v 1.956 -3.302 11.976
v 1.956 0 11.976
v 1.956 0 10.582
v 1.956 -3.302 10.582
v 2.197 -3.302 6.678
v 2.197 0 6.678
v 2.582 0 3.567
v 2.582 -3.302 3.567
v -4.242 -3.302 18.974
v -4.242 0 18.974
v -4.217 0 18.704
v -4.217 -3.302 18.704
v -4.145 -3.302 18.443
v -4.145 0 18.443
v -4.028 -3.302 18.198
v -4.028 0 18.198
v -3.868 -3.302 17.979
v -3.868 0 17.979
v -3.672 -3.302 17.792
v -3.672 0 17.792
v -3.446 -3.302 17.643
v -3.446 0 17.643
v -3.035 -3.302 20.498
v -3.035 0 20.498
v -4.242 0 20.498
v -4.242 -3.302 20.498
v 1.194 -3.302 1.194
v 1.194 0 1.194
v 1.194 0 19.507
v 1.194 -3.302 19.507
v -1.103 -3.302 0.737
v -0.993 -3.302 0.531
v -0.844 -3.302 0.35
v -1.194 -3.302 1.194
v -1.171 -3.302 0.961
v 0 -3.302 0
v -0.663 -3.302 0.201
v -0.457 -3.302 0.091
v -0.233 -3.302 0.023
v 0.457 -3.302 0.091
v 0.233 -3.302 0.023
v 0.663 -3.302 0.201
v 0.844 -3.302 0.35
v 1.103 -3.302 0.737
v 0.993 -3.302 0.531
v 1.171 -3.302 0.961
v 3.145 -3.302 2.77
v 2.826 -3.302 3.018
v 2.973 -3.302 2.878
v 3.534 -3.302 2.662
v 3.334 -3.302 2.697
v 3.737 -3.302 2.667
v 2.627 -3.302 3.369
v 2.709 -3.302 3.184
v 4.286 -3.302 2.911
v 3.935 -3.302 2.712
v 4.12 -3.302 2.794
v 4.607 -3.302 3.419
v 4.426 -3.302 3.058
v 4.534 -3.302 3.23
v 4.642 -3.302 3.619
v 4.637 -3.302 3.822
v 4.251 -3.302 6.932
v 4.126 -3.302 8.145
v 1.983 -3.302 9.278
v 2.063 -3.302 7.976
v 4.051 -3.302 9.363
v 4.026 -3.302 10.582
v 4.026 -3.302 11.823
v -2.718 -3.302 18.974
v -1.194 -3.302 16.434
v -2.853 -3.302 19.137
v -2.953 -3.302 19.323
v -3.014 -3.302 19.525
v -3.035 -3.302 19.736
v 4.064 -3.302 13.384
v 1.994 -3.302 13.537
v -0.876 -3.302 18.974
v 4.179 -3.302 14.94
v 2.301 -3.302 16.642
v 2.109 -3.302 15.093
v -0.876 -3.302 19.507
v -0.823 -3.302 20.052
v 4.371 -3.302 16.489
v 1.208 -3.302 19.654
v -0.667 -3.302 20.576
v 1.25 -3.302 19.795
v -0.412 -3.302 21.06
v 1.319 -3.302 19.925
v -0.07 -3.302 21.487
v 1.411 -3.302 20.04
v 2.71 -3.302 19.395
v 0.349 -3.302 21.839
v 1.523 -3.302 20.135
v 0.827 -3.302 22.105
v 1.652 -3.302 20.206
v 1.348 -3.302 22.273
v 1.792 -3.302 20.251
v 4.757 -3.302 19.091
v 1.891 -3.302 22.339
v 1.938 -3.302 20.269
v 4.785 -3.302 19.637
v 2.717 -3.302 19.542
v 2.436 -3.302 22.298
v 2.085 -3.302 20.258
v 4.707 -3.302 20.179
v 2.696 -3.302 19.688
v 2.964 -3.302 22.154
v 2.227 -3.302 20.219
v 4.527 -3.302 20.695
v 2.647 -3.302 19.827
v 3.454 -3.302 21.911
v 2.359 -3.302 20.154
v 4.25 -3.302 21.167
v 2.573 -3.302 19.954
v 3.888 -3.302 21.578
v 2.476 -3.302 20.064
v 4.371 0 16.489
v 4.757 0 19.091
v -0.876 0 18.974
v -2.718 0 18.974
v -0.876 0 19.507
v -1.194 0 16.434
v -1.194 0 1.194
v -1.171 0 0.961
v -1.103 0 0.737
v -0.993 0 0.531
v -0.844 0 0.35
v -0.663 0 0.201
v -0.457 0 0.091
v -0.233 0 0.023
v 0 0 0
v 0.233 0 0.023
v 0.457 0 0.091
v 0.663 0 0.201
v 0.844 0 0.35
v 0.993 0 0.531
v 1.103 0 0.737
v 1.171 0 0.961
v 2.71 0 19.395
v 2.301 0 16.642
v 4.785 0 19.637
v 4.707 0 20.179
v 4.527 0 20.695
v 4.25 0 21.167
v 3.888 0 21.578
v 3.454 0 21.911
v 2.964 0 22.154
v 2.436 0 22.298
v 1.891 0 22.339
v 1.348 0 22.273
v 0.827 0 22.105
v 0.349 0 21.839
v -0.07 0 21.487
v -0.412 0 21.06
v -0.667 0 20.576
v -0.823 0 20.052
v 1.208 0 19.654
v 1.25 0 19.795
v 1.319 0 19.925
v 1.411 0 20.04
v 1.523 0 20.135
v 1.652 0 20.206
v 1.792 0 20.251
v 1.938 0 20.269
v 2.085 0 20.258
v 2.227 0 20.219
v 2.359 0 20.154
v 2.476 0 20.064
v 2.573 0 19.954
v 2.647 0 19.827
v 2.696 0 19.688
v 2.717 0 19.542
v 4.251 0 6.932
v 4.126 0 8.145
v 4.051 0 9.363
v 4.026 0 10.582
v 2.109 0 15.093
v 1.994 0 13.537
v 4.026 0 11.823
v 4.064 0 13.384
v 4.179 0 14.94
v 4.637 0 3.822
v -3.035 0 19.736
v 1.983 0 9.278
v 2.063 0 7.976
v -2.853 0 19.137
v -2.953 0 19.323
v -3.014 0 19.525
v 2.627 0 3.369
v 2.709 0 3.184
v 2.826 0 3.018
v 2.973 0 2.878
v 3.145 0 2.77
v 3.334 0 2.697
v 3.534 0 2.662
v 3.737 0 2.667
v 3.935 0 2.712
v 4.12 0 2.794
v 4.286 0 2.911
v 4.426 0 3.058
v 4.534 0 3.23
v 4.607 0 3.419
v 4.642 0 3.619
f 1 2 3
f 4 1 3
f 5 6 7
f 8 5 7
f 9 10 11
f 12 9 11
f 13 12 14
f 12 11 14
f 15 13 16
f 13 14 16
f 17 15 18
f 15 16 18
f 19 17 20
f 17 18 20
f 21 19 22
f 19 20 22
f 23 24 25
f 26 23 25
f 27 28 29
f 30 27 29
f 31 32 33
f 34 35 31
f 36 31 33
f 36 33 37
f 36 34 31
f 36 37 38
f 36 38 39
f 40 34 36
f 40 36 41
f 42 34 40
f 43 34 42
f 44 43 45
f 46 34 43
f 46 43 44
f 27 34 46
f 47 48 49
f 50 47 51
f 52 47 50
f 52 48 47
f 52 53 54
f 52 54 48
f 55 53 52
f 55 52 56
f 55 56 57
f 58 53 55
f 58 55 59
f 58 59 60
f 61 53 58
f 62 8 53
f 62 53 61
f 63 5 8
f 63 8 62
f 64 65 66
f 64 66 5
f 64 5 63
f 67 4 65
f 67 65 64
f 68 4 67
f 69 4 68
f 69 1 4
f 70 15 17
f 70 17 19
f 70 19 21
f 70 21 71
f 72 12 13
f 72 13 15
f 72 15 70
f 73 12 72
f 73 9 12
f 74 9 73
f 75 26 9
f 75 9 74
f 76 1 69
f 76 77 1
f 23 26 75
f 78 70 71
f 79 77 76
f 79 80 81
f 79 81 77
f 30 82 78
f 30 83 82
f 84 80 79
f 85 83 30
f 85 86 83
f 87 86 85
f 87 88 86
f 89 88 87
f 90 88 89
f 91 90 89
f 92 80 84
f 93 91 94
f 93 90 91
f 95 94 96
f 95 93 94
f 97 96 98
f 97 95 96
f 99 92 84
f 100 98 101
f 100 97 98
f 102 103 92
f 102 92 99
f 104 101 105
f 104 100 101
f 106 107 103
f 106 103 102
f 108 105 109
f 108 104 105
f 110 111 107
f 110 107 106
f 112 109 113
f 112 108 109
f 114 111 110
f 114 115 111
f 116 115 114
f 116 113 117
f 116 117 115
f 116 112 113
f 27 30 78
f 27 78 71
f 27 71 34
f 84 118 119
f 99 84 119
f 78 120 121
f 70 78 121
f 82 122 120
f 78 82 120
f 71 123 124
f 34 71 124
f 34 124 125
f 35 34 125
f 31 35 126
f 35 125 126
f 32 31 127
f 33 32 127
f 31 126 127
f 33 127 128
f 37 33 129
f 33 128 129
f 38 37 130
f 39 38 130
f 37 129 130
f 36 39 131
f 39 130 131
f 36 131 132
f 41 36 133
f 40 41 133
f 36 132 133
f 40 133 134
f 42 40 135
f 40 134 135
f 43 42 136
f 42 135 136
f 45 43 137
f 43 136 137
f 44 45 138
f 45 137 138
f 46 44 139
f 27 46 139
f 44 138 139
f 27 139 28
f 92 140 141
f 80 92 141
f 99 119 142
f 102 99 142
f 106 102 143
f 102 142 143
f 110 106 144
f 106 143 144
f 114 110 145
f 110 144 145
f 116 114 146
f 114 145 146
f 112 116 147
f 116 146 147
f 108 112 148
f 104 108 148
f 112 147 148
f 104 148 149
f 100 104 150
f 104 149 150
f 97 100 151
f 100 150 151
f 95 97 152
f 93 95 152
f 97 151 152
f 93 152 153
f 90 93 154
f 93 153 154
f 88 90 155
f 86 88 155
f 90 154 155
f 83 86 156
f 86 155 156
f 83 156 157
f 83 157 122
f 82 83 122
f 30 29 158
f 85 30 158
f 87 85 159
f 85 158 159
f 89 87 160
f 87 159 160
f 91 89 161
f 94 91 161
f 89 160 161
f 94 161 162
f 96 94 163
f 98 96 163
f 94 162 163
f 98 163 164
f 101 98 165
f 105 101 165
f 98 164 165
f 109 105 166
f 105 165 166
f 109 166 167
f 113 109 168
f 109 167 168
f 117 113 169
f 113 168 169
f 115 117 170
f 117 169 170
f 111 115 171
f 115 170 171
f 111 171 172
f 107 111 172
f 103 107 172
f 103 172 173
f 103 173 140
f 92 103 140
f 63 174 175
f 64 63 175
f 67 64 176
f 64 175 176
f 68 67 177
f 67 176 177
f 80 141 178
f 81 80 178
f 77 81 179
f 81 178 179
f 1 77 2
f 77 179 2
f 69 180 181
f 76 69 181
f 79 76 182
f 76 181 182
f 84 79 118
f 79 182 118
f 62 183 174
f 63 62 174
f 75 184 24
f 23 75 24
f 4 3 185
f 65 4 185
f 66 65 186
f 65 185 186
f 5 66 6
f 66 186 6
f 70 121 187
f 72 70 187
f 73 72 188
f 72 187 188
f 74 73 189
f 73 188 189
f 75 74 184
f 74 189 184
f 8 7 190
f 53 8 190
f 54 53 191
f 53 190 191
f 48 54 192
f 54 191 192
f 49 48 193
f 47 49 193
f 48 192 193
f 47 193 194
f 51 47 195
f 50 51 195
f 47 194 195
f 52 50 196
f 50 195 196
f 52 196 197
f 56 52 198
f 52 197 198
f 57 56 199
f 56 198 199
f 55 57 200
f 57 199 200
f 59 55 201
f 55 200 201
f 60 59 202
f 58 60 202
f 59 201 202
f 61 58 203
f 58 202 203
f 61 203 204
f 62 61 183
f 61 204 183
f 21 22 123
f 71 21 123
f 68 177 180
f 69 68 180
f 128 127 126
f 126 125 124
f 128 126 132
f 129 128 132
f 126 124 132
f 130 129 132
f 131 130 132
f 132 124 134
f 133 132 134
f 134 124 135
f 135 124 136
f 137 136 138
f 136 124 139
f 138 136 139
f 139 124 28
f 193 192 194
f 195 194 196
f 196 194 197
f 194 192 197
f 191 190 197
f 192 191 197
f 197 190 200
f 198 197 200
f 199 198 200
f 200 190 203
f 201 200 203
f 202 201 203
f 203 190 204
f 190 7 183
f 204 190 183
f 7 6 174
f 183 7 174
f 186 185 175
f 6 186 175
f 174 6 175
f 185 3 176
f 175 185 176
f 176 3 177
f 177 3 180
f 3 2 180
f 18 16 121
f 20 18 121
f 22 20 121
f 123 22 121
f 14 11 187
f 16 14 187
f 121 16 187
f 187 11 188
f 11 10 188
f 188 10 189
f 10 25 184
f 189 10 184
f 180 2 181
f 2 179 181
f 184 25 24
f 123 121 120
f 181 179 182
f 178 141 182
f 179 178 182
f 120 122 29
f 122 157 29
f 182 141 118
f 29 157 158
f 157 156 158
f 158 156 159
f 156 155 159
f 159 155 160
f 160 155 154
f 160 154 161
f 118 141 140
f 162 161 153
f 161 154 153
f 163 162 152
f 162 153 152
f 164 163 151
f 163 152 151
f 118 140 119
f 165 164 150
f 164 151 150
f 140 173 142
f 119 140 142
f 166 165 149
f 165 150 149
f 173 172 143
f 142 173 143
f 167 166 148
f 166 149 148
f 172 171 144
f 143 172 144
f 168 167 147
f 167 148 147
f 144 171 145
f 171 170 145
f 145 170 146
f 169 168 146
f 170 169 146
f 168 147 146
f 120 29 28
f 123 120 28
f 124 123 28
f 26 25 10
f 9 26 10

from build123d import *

# Parameters (mm, degrees)
F1_DEPTH = 3.302


with BuildPart() as f1:
    # F0 (on Front) → F1 (new body)
    with BuildSketch(Plane.XZ):
        with BuildLine():
            Line((-1.1938, 18.9738), (-2.7178, 18.9738))
            ThreePointArc((-2.7178, 18.9738), (-2.95275, 19.32305), (-3.0353, 19.7358))
            Line((-3.0353, 19.7358), (-3.0353, 20.4978))
            Line((-3.0353, 20.4978), (-4.2418, 20.4978))
            Line((-4.2418, 20.4978), (-4.2418, 18.9738))
            ThreePointArc((-4.2418, 18.9738), (-4.027637, 18.19849), (-3.445879, 17.643037))
            Line((-3.445879, 17.643037), (-1.1938, 16.4338))
            Line((-1.1938, 16.4338), (-1.1938, 1.1938))
            ThreePointArc((-1.1938, 1.1938), (0, 0), (1.1938, 1.1938))
            Line((1.1938, 1.1938), (1.1938, 19.5072))
            ThreePointArc((1.1938, 19.5072), (2.011944, 20.267129), (2.709527, 19.395217))
            Line((2.709527, 19.395217), (2.300525, 16.642347))
            ThreePointArc((2.300525, 16.642347), (2.042099, 14.315723), (1.9558, 11.976382))
            Line((1.9558, 11.976382), (1.9558, 10.582195))
            ThreePointArc((1.9558, 10.582195), (2.016106, 8.626227), (2.196796, 6.67769))
            Line((2.196796, 6.67769), (2.58224, 3.567194))
            ThreePointArc((2.58224, 3.567194), (3.73672, 2.667287), (4.636627, 3.821767))
            Line((4.636627, 3.821767), (4.251183, 6.932264))
            ThreePointArc((4.251183, 6.932264), (4.082274, 8.753757), (4.0259, 10.582195))
            Line((4.0259, 10.582195), (4.0259, 11.823441))
            ThreePointArc((4.0259, 11.823441), (4.112199, 14.162782), (4.370625, 16.489406))
            Line((4.370625, 16.489406), (4.75715, 19.090996))
            ThreePointArc((4.75715, 19.090996), (2.164469, 22.331602), (-0.8763, 19.5072))
            Line((-0.8763, 19.5072), (-0.8763, 18.9738))
            Line((-0.8763, 18.9738), (-1.1938, 18.9738))
        make_face()
    extrude(amount=F1_DEPTH)


solid = f1.part
